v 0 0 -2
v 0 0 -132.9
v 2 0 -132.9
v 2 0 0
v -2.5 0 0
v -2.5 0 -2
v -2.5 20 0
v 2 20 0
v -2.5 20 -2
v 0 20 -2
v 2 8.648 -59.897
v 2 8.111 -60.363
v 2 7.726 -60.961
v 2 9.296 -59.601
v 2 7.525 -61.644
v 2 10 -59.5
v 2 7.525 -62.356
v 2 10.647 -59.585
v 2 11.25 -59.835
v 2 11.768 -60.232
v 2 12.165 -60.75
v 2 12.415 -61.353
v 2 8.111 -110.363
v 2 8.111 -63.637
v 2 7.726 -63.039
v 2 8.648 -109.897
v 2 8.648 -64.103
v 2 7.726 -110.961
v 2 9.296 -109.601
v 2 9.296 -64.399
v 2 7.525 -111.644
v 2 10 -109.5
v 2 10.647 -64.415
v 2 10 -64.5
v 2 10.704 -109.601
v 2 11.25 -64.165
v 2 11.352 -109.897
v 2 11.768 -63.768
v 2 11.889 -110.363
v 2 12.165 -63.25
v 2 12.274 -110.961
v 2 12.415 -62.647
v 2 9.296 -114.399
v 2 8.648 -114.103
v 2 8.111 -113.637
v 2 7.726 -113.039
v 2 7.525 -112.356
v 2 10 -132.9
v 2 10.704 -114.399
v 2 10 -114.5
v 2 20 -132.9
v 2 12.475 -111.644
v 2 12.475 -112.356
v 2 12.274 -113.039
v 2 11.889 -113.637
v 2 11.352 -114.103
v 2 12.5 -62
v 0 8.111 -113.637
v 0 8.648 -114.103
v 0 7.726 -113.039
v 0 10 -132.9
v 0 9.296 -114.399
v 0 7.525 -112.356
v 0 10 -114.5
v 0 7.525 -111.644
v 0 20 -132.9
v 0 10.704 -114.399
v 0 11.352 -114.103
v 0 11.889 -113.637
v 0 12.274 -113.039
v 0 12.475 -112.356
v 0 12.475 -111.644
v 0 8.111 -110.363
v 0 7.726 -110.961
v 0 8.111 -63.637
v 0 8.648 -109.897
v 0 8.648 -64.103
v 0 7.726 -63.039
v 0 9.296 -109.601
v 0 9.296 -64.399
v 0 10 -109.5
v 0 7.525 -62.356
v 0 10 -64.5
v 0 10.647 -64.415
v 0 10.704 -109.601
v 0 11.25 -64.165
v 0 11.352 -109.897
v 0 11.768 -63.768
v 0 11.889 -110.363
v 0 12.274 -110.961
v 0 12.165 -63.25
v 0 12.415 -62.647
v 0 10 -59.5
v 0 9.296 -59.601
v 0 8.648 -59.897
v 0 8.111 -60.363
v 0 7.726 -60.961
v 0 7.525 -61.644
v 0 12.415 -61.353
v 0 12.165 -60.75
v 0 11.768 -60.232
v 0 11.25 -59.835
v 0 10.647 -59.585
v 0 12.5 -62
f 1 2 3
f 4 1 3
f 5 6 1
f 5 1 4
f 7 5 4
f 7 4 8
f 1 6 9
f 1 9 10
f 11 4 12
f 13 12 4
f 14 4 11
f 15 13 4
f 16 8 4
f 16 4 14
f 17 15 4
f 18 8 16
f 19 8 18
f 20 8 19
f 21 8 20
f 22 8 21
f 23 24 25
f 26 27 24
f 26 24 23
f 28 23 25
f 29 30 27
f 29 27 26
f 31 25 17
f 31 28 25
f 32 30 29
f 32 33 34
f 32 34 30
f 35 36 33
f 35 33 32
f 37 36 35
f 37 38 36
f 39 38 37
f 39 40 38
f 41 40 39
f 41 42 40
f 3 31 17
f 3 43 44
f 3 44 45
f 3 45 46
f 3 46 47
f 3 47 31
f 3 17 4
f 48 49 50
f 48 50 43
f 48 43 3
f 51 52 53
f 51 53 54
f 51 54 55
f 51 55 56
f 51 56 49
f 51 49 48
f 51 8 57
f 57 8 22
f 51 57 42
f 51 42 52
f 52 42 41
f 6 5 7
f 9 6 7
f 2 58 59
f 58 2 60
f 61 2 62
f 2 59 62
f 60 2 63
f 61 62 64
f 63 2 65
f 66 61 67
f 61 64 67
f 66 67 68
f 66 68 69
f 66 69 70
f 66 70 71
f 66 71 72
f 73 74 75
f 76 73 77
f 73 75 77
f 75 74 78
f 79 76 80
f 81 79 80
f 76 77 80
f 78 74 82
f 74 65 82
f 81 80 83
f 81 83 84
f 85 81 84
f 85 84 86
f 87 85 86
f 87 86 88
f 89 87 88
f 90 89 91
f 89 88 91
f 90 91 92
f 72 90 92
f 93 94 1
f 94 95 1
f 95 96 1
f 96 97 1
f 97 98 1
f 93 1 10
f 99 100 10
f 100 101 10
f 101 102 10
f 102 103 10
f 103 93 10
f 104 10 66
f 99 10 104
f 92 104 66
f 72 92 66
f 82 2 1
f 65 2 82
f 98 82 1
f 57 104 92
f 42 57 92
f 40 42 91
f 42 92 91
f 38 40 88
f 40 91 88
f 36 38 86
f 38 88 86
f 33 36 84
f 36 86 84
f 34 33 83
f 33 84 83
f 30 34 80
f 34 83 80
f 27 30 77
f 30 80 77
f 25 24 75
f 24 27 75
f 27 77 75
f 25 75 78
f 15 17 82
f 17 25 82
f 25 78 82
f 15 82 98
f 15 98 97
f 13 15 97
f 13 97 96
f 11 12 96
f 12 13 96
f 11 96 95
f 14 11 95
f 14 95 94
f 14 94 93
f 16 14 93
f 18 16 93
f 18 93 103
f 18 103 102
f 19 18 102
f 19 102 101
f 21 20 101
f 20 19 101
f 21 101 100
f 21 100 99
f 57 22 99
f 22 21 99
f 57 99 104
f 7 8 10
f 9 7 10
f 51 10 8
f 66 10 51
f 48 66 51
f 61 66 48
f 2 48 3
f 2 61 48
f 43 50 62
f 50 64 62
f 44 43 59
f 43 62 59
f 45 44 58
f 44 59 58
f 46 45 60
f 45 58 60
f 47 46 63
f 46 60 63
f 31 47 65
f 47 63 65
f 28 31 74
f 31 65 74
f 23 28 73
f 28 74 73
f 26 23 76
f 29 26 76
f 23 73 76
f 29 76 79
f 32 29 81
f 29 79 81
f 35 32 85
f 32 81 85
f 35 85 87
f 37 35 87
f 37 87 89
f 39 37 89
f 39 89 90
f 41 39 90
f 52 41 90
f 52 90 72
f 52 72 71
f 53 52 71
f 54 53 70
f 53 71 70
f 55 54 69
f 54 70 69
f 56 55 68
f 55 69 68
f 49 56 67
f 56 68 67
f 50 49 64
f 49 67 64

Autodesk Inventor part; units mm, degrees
ref_plane "YZ Plane" through (0, 0, 0) normal (1, 0, 0) x (0, 1, 0)
ref_plane "XZ Plane" through (0, 0, 0) normal (0, 1, 0) x (-1, 0, 0)
ref_plane "XY Plane" through (0, 0, 0) normal (0, 0, 1) x (1, 0, 0)
sketch "Esboço1" plane through (0, 0, 0) normal (1, 0, 0) x (0, 1, 0)
  line L0 (0, 0) -> (20, 0)
  line L1 (20, 0) -> (20, -132.9)
  line L2 (20, -132.9) -> (0, -132.9)
  line L3 (0, -132.9) -> (0, 0)
  line L4 (10, -132.9) -> (10, -62)
  circle A0 centre (10, -62) radius 2.5
  line L5 (10, -62) -> (10, -12)
  circle A1 centre (10, -12) radius 2.5
  dimension "d0" = 20
  dimension "d1" = 132.9
  dimension "d2" = 70.9
  dimension "d3" = 5
  dimension "d4" = 50
  dimension "d5" = 5
extrude "Extrusão1" add sketch "Esboço1" along normal blind 2
sketch "Esboço2" plane through (0, 0, 0) normal (0, 0, 1) x (1, 0, 0)
  line L0 (2, 20) -> (2, 0) projected
  line L1 (2, 0) -> (-2.5, 0)
  line L2 (-2.5, 0) -> (-2.5, 20)
  line L3 (-2.5, 20) -> (2, 20)
  line L4 (2, 20) -> (2, 0)
  point P0 (0, 0)
  dimension "d8" = 4.5
extrude "Extrusão2" add sketch "Esboço2" against normal blind 2
sketch "Esboço3" plane through (2, 0, 0) normal (1, 0, 0) x (0, 0, -1)
  circle A0 centre (62, 10) radius 2.5 construction
  line L0 (62, 10) -> (112, 10) construction
  point P0 (0, 0)
  dimension "d11" = 50
hole "Furo1" at (2, 10, -112) direction (-1, 0, 0) diameter 5 end through all
sketch "Esboço4" plane through (2, 0, 0) normal (1, 0, 0) x (0, 0, -1)
  circle A0 centre (12, 10) radius 2.5 projected
  circle A1 centre (12, 10) radius 2.5
  point P0 (0, 0)
extrude "Extrusão3" add sketch "Esboço4" against normal blind 2
properties part number "Chapa da Caixa de Segurança"
